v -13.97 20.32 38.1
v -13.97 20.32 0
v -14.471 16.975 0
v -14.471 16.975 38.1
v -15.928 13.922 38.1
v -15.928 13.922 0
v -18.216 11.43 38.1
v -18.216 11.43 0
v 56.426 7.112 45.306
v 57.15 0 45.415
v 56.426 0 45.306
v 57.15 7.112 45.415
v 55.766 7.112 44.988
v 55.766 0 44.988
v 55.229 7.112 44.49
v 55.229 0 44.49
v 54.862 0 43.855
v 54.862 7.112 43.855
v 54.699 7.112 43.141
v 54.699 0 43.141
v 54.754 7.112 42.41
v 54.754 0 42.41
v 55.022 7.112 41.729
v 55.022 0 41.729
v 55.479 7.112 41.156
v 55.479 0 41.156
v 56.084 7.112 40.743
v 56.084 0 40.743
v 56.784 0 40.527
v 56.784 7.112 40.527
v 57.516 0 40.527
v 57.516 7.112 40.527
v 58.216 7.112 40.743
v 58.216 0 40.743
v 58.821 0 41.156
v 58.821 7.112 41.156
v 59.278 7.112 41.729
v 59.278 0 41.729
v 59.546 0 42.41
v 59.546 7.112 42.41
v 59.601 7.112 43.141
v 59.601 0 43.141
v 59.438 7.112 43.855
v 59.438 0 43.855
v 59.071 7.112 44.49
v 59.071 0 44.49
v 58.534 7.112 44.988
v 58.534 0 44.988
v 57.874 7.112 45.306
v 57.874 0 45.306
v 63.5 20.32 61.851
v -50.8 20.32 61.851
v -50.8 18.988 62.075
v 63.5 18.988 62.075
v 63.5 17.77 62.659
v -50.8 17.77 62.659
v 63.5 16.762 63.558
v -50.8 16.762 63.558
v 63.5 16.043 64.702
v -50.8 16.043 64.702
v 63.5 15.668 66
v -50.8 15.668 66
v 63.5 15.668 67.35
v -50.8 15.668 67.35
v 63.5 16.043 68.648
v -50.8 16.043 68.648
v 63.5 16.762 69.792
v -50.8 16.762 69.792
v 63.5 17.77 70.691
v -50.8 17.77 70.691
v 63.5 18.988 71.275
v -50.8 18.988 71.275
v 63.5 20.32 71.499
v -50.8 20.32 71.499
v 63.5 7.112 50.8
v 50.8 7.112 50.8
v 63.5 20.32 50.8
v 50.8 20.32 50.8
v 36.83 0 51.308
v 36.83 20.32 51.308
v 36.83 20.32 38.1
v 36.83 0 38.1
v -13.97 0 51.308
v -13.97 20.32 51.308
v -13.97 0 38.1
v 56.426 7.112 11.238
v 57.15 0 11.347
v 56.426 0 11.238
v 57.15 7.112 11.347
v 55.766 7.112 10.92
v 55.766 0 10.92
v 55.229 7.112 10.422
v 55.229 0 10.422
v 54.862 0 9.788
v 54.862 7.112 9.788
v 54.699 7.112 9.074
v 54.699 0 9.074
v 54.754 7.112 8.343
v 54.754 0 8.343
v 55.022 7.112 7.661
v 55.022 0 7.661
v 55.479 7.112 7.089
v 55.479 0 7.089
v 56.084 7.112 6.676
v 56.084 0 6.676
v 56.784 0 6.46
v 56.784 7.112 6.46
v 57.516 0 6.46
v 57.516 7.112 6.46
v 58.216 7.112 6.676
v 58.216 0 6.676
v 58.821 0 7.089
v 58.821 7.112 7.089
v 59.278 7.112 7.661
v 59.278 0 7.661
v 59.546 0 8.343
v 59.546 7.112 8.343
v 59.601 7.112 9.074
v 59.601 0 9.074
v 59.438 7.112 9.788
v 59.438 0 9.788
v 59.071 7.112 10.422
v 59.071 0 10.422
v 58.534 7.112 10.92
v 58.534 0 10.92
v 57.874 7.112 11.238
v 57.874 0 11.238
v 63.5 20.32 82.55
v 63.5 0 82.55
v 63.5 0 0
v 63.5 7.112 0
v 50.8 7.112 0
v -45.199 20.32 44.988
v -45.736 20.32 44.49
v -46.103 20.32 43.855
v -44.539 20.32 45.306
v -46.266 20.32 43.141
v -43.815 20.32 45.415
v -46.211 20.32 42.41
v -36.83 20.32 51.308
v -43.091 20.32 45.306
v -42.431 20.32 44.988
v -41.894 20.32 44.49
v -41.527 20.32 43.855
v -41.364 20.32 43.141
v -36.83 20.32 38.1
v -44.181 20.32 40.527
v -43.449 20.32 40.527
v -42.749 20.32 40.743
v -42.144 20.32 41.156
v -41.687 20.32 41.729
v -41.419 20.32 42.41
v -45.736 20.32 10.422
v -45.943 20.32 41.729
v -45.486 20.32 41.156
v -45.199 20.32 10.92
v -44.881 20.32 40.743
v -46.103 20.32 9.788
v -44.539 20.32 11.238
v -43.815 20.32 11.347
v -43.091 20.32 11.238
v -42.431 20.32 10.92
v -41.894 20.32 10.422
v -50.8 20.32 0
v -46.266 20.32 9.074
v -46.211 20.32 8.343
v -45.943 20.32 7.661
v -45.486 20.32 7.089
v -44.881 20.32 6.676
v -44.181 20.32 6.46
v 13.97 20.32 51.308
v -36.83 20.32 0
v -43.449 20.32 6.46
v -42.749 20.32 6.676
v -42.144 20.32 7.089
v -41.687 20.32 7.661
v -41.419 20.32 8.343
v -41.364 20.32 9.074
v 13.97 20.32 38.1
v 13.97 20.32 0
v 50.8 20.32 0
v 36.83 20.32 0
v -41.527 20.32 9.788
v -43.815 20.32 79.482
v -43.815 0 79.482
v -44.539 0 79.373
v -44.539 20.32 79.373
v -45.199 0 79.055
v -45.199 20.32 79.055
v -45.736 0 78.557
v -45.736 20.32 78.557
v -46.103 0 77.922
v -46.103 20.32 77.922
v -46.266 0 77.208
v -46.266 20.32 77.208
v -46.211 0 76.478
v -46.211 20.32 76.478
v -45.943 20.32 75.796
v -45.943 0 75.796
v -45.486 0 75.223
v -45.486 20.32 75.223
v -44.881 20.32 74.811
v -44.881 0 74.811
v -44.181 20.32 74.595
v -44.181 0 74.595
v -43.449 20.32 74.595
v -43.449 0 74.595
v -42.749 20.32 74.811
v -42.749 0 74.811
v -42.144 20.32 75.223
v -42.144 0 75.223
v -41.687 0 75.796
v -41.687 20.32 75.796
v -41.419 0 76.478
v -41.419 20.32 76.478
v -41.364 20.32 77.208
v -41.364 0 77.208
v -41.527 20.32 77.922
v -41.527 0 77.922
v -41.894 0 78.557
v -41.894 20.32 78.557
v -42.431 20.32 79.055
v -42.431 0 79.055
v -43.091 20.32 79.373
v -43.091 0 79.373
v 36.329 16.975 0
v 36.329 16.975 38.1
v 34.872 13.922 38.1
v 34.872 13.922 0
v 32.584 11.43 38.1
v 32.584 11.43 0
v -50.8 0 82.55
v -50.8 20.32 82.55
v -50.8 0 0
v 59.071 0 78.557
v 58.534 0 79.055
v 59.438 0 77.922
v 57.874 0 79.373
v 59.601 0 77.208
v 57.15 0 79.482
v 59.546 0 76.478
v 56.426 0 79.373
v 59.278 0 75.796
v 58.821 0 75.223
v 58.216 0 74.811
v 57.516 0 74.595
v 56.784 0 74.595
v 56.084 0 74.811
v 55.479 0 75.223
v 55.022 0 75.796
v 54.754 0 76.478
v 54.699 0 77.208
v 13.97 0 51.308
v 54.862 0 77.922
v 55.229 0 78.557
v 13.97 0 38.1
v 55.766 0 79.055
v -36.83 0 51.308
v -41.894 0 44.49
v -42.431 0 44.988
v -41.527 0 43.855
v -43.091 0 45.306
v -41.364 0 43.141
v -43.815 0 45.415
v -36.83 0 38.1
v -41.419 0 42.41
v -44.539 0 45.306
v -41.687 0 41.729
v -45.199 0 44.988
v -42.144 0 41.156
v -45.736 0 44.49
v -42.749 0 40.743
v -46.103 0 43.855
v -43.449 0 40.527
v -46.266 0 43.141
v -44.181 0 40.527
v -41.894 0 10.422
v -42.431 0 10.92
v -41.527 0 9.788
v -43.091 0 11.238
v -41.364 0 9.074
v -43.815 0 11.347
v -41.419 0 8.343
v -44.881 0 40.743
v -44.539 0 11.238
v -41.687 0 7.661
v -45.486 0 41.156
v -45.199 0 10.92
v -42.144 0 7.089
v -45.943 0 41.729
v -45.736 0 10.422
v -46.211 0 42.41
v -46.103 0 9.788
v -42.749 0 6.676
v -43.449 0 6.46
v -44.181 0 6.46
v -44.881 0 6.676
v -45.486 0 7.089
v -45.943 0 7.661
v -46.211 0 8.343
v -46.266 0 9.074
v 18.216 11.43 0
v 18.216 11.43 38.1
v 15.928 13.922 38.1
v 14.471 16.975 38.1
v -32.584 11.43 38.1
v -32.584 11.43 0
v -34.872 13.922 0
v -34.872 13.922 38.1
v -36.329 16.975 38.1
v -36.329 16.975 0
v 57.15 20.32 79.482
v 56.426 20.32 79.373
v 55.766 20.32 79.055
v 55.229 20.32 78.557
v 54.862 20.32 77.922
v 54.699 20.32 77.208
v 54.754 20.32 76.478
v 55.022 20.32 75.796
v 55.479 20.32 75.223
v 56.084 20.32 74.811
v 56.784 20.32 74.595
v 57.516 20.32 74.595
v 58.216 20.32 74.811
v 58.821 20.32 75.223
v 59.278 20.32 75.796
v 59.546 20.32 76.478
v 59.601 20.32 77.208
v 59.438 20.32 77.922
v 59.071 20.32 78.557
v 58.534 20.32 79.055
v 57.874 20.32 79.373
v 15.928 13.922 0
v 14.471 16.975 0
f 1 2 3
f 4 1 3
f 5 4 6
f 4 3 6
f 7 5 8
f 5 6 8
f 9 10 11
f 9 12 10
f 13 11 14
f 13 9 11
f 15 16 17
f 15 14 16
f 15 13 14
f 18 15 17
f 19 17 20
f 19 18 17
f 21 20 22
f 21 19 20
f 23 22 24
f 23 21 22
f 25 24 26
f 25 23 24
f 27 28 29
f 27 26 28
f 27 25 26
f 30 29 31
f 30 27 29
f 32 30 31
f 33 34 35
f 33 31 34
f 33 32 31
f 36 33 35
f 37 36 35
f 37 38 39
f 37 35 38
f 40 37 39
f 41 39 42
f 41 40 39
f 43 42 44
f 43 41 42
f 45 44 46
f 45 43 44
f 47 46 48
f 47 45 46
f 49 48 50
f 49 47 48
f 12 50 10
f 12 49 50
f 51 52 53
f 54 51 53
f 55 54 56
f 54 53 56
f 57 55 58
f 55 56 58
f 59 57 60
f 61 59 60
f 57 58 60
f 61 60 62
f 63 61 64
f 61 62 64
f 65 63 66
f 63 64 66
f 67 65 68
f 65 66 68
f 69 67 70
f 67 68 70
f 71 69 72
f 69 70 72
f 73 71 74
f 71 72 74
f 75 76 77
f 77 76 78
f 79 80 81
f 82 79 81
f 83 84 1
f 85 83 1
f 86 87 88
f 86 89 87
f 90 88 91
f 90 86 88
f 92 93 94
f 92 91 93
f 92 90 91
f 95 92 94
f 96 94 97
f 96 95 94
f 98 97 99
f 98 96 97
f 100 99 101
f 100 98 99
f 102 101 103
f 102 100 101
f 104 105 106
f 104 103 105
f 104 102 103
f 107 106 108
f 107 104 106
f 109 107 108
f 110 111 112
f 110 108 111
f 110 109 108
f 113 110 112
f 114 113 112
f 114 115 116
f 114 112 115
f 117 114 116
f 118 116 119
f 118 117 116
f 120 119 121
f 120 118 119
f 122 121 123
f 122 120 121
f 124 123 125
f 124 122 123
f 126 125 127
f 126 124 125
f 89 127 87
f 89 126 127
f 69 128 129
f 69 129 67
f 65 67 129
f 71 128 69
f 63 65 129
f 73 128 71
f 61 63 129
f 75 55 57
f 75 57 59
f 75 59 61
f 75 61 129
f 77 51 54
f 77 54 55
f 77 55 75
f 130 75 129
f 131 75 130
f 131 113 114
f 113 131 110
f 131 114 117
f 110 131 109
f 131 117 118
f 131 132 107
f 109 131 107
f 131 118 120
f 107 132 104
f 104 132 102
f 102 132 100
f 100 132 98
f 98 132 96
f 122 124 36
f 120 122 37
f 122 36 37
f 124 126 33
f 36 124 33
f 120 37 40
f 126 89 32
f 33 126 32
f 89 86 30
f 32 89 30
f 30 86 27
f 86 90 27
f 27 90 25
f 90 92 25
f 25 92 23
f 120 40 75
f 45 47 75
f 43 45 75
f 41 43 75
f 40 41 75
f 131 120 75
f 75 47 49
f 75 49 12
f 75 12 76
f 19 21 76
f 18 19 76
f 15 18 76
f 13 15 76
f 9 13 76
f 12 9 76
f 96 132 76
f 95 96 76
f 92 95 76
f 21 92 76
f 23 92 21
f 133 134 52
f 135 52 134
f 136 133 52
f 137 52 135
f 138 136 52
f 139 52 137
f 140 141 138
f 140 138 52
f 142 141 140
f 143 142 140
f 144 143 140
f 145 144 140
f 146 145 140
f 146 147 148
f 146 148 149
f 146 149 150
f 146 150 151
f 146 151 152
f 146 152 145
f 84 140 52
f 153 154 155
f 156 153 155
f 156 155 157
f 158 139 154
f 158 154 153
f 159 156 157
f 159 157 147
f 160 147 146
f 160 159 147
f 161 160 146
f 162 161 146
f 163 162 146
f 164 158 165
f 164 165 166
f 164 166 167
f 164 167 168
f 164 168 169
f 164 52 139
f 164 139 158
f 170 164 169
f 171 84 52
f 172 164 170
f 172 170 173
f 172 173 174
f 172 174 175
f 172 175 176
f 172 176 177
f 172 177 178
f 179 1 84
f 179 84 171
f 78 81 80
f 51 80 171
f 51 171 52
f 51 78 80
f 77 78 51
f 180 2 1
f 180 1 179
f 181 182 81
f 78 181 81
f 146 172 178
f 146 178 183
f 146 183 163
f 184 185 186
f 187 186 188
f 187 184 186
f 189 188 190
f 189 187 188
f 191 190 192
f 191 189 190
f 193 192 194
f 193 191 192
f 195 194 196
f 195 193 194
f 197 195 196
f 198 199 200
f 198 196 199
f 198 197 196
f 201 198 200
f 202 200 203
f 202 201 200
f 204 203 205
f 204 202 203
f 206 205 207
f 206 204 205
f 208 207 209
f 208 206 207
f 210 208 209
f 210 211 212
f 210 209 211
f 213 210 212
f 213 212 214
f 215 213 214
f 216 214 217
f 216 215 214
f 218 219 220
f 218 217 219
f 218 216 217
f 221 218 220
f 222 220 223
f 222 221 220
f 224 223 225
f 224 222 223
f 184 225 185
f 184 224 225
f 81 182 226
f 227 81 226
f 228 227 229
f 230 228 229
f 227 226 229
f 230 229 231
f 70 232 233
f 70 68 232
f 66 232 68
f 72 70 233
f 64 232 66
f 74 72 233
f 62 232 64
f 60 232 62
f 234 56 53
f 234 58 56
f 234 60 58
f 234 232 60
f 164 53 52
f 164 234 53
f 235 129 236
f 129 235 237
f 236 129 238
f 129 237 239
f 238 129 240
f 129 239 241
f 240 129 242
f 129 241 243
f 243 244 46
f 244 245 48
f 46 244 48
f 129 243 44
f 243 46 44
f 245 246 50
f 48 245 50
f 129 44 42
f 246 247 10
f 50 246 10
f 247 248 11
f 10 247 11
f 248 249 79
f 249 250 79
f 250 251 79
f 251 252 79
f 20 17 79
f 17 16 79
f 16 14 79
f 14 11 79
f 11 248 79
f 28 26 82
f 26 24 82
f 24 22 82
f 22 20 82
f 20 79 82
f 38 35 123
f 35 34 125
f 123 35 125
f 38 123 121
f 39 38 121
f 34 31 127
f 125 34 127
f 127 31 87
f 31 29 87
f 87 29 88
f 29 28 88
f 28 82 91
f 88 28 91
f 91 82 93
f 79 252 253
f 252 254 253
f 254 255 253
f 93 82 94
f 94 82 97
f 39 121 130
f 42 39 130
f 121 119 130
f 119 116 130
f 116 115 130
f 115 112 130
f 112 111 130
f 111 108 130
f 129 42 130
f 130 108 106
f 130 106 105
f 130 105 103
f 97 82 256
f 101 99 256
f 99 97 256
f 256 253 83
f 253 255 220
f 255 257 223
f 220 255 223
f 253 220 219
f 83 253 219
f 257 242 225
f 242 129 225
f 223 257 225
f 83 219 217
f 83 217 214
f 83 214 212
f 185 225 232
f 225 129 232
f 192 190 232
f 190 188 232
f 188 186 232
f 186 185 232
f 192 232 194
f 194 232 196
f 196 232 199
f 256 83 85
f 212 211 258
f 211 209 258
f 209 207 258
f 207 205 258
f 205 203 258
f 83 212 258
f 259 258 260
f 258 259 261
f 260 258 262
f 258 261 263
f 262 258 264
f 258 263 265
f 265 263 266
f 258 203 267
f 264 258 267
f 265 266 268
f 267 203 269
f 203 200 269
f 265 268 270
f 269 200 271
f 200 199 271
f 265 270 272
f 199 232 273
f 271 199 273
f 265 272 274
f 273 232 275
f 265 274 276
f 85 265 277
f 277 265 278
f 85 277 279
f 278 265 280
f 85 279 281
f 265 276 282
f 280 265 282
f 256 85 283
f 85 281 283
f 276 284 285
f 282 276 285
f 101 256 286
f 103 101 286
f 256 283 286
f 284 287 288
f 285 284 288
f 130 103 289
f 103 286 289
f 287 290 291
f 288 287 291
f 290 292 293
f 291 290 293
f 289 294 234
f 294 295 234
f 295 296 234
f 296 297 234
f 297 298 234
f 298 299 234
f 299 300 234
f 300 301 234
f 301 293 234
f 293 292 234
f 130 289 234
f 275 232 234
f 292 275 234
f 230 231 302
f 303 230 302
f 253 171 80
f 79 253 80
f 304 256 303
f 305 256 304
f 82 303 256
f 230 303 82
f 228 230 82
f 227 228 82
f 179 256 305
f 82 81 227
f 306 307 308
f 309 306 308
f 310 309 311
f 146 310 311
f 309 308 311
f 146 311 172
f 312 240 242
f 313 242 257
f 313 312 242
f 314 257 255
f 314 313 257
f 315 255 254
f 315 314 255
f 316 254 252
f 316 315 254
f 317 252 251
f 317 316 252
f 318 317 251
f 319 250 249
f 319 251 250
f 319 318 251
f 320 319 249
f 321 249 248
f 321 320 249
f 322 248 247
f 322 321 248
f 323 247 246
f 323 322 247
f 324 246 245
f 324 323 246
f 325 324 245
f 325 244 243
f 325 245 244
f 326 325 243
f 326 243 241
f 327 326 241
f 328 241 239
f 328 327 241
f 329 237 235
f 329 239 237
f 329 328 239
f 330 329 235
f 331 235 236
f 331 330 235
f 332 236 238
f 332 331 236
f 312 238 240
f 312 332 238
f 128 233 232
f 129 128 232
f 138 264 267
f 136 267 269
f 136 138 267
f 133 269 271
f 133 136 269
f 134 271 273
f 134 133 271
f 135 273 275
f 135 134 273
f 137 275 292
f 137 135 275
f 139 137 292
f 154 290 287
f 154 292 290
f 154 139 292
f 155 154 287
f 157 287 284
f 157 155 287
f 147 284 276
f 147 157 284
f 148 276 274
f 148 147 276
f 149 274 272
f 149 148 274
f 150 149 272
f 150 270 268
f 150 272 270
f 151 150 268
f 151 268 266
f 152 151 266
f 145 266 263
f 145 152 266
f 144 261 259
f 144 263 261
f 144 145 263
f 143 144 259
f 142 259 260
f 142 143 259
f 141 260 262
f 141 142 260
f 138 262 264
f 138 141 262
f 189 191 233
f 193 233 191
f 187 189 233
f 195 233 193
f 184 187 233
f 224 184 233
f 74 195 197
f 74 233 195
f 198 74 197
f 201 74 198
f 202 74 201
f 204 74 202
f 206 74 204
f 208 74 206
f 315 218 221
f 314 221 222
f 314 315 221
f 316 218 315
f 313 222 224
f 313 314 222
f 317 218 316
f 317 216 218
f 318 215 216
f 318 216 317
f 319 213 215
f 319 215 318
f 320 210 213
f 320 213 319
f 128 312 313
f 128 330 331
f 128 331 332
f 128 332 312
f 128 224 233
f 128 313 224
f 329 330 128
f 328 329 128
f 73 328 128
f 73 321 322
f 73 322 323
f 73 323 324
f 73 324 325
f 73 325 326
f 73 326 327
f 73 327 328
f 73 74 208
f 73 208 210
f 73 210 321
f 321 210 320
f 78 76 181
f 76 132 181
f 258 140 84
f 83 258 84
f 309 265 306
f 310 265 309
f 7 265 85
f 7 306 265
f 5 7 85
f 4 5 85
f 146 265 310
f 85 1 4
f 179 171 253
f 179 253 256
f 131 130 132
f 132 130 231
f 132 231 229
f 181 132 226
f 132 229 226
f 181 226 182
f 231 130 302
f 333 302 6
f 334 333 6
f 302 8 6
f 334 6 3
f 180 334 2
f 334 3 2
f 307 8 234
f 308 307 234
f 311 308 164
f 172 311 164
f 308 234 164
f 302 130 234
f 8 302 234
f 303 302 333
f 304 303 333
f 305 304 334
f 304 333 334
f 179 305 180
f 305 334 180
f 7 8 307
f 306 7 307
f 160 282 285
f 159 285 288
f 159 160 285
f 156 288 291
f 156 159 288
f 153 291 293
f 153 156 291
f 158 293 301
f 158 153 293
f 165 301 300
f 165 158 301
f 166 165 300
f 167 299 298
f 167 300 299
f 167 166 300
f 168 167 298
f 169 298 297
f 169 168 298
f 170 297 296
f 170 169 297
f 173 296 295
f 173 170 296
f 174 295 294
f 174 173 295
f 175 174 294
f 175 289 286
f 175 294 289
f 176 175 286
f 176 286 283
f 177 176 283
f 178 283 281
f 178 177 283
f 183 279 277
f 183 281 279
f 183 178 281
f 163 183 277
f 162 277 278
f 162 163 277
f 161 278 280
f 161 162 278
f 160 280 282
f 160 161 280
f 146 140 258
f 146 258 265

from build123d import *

# Parameters (mm, degrees)
BOSS_EXTRUDE1_DEPTH  = 38.1
SKETCH7_W            = 101.6
SKETCH7_H            = 20.32
BOSS_EXTRUDE2_DEPTH  = 44.45
BOSS_EXTRUDE8_DEPTH  = 12.7
SKETCH8_W            = 22.86
SKETCH8_H            = 13.208
CUT_EXTRUDE1_DEPTH   = 20.32
SKETCH9_R            = 4.826
CUT_EXTRUDE2_DEPTH   = 114.3
LPATTERN1_COUNT      = 3
LPATTERN1_PITCH      = 34.067332164
LPATTERN1_COUNT_DIR2 = 2
LPATTERN1_PITCH_DIR2 = 100.965


with BuildPart() as part:
    # Sketch1 → Boss-Extrude1 (new body)
    with BuildSketch(Plane.XY):
        with BuildLine():
            Line((-50.8, 0), (50.8, 0))
            Line((50.8, 0), (50.8, 20.32))
            Line((50.8, 20.32), (36.83, 20.32))
            ThreePointArc((36.83, 20.32), (35.714076836, 15.394076836), (32.584204897, 11.43))
            Line((32.584204897, 11.43), (18.215795103, 11.43))
            ThreePointArc((18.215795103, 11.43), (15.085923164, 15.394076836), (13.97, 20.32))
            Line((13.97, 20.32), (-13.97, 20.32))
            ThreePointArc((-13.97, 20.32), (-15.085923164, 15.394076836), (-18.215795103, 11.43))
            Line((-18.215795103, 11.43), (-32.584204897, 11.43))
            ThreePointArc((-32.584204897, 11.43), (-35.714076836, 15.394076836), (-36.83, 20.32))
            Line((-36.83, 20.32), (-50.8, 20.32))
            Line((-50.8, 20.32), (-50.8, 0))
        make_face()
    extrude(amount=BOSS_EXTRUDE1_DEPTH)

    # Sketch7 → Boss-Extrude2 (add)
    with BuildSketch(Plane.XY.offset(38.1)):
        with Locations((0, 10.16)):
            Rectangle(SKETCH7_W, SKETCH7_H)
    extrude(amount=BOSS_EXTRUDE2_DEPTH)

    # Sketch20 → Boss-Extrude8 (add)
    with BuildSketch(Plane(origin=(50.8, 0, 0), x_dir=(0, 0, -1), z_dir=(1, 0, 0))):
        Polygon((-50.8, 0), (0, 0), (0, 7.112), (-50.8, 7.112), (-50.8, 20.32), (-82.55, 20.32), (-82.55, 3.874334441), (-82.55, 0), align=None)
    extrude(amount=BOSS_EXTRUDE8_DEPTH)

    # Sketch8 → Cut-Extrude1 (cut)
    with BuildSketch(Plane(origin=(0, 20.32, 0), x_dir=(1, 0, 0), z_dir=(0, 1, 0))):
        with Locations((-25.4, -44.704)):
            Rectangle(SKETCH8_W, SKETCH8_H)
        with Locations((25.4, -44.704)):
            Rectangle(SKETCH8_W, SKETCH8_H)
    extrude(amount=-CUT_EXTRUDE1_DEPTH, mode=Mode.SUBTRACT)

    # Sketch5 → #10 (0.1935) Diameter Hole1 (revolve, cut)
    with BuildSketch(Plane(origin=(-43.815, 20.32, 8.89), x_dir=(0, 0, 1), z_dir=(1, 0, 0))):
        Polygon((0, 0), (0, 25.4), (2.45745, 23.923415072), (2.45745, 0), align=None)
    f_10_0_1935_diameter_hole1 = revolve(axis=Axis((-43.815, 26.67, 8.89), (0, -1, 0)), mode=Mode.SUBTRACT)

    # Sketch9 → Cut-Extrude2 (cut)
    with BuildSketch(Plane.ZY.offset(50.8)):
        with Locations((66.675, 20.447)):
            Circle(SKETCH9_R)
    extrude(amount=-CUT_EXTRUDE2_DEPTH, mode=Mode.SUBTRACT)

    # LPattern1: 10 _0.1935_ Diameter Hole1 3 × 2
    with Locations(*[(j * LPATTERN1_PITCH_DIR2, 0, i * LPATTERN1_PITCH) for i in range(LPATTERN1_COUNT) for j in range(LPATTERN1_COUNT_DIR2) if (i, j) != (0, 0)]):
        add(f_10_0_1935_diameter_hole1, mode=Mode.SUBTRACT)


solid = part.part
